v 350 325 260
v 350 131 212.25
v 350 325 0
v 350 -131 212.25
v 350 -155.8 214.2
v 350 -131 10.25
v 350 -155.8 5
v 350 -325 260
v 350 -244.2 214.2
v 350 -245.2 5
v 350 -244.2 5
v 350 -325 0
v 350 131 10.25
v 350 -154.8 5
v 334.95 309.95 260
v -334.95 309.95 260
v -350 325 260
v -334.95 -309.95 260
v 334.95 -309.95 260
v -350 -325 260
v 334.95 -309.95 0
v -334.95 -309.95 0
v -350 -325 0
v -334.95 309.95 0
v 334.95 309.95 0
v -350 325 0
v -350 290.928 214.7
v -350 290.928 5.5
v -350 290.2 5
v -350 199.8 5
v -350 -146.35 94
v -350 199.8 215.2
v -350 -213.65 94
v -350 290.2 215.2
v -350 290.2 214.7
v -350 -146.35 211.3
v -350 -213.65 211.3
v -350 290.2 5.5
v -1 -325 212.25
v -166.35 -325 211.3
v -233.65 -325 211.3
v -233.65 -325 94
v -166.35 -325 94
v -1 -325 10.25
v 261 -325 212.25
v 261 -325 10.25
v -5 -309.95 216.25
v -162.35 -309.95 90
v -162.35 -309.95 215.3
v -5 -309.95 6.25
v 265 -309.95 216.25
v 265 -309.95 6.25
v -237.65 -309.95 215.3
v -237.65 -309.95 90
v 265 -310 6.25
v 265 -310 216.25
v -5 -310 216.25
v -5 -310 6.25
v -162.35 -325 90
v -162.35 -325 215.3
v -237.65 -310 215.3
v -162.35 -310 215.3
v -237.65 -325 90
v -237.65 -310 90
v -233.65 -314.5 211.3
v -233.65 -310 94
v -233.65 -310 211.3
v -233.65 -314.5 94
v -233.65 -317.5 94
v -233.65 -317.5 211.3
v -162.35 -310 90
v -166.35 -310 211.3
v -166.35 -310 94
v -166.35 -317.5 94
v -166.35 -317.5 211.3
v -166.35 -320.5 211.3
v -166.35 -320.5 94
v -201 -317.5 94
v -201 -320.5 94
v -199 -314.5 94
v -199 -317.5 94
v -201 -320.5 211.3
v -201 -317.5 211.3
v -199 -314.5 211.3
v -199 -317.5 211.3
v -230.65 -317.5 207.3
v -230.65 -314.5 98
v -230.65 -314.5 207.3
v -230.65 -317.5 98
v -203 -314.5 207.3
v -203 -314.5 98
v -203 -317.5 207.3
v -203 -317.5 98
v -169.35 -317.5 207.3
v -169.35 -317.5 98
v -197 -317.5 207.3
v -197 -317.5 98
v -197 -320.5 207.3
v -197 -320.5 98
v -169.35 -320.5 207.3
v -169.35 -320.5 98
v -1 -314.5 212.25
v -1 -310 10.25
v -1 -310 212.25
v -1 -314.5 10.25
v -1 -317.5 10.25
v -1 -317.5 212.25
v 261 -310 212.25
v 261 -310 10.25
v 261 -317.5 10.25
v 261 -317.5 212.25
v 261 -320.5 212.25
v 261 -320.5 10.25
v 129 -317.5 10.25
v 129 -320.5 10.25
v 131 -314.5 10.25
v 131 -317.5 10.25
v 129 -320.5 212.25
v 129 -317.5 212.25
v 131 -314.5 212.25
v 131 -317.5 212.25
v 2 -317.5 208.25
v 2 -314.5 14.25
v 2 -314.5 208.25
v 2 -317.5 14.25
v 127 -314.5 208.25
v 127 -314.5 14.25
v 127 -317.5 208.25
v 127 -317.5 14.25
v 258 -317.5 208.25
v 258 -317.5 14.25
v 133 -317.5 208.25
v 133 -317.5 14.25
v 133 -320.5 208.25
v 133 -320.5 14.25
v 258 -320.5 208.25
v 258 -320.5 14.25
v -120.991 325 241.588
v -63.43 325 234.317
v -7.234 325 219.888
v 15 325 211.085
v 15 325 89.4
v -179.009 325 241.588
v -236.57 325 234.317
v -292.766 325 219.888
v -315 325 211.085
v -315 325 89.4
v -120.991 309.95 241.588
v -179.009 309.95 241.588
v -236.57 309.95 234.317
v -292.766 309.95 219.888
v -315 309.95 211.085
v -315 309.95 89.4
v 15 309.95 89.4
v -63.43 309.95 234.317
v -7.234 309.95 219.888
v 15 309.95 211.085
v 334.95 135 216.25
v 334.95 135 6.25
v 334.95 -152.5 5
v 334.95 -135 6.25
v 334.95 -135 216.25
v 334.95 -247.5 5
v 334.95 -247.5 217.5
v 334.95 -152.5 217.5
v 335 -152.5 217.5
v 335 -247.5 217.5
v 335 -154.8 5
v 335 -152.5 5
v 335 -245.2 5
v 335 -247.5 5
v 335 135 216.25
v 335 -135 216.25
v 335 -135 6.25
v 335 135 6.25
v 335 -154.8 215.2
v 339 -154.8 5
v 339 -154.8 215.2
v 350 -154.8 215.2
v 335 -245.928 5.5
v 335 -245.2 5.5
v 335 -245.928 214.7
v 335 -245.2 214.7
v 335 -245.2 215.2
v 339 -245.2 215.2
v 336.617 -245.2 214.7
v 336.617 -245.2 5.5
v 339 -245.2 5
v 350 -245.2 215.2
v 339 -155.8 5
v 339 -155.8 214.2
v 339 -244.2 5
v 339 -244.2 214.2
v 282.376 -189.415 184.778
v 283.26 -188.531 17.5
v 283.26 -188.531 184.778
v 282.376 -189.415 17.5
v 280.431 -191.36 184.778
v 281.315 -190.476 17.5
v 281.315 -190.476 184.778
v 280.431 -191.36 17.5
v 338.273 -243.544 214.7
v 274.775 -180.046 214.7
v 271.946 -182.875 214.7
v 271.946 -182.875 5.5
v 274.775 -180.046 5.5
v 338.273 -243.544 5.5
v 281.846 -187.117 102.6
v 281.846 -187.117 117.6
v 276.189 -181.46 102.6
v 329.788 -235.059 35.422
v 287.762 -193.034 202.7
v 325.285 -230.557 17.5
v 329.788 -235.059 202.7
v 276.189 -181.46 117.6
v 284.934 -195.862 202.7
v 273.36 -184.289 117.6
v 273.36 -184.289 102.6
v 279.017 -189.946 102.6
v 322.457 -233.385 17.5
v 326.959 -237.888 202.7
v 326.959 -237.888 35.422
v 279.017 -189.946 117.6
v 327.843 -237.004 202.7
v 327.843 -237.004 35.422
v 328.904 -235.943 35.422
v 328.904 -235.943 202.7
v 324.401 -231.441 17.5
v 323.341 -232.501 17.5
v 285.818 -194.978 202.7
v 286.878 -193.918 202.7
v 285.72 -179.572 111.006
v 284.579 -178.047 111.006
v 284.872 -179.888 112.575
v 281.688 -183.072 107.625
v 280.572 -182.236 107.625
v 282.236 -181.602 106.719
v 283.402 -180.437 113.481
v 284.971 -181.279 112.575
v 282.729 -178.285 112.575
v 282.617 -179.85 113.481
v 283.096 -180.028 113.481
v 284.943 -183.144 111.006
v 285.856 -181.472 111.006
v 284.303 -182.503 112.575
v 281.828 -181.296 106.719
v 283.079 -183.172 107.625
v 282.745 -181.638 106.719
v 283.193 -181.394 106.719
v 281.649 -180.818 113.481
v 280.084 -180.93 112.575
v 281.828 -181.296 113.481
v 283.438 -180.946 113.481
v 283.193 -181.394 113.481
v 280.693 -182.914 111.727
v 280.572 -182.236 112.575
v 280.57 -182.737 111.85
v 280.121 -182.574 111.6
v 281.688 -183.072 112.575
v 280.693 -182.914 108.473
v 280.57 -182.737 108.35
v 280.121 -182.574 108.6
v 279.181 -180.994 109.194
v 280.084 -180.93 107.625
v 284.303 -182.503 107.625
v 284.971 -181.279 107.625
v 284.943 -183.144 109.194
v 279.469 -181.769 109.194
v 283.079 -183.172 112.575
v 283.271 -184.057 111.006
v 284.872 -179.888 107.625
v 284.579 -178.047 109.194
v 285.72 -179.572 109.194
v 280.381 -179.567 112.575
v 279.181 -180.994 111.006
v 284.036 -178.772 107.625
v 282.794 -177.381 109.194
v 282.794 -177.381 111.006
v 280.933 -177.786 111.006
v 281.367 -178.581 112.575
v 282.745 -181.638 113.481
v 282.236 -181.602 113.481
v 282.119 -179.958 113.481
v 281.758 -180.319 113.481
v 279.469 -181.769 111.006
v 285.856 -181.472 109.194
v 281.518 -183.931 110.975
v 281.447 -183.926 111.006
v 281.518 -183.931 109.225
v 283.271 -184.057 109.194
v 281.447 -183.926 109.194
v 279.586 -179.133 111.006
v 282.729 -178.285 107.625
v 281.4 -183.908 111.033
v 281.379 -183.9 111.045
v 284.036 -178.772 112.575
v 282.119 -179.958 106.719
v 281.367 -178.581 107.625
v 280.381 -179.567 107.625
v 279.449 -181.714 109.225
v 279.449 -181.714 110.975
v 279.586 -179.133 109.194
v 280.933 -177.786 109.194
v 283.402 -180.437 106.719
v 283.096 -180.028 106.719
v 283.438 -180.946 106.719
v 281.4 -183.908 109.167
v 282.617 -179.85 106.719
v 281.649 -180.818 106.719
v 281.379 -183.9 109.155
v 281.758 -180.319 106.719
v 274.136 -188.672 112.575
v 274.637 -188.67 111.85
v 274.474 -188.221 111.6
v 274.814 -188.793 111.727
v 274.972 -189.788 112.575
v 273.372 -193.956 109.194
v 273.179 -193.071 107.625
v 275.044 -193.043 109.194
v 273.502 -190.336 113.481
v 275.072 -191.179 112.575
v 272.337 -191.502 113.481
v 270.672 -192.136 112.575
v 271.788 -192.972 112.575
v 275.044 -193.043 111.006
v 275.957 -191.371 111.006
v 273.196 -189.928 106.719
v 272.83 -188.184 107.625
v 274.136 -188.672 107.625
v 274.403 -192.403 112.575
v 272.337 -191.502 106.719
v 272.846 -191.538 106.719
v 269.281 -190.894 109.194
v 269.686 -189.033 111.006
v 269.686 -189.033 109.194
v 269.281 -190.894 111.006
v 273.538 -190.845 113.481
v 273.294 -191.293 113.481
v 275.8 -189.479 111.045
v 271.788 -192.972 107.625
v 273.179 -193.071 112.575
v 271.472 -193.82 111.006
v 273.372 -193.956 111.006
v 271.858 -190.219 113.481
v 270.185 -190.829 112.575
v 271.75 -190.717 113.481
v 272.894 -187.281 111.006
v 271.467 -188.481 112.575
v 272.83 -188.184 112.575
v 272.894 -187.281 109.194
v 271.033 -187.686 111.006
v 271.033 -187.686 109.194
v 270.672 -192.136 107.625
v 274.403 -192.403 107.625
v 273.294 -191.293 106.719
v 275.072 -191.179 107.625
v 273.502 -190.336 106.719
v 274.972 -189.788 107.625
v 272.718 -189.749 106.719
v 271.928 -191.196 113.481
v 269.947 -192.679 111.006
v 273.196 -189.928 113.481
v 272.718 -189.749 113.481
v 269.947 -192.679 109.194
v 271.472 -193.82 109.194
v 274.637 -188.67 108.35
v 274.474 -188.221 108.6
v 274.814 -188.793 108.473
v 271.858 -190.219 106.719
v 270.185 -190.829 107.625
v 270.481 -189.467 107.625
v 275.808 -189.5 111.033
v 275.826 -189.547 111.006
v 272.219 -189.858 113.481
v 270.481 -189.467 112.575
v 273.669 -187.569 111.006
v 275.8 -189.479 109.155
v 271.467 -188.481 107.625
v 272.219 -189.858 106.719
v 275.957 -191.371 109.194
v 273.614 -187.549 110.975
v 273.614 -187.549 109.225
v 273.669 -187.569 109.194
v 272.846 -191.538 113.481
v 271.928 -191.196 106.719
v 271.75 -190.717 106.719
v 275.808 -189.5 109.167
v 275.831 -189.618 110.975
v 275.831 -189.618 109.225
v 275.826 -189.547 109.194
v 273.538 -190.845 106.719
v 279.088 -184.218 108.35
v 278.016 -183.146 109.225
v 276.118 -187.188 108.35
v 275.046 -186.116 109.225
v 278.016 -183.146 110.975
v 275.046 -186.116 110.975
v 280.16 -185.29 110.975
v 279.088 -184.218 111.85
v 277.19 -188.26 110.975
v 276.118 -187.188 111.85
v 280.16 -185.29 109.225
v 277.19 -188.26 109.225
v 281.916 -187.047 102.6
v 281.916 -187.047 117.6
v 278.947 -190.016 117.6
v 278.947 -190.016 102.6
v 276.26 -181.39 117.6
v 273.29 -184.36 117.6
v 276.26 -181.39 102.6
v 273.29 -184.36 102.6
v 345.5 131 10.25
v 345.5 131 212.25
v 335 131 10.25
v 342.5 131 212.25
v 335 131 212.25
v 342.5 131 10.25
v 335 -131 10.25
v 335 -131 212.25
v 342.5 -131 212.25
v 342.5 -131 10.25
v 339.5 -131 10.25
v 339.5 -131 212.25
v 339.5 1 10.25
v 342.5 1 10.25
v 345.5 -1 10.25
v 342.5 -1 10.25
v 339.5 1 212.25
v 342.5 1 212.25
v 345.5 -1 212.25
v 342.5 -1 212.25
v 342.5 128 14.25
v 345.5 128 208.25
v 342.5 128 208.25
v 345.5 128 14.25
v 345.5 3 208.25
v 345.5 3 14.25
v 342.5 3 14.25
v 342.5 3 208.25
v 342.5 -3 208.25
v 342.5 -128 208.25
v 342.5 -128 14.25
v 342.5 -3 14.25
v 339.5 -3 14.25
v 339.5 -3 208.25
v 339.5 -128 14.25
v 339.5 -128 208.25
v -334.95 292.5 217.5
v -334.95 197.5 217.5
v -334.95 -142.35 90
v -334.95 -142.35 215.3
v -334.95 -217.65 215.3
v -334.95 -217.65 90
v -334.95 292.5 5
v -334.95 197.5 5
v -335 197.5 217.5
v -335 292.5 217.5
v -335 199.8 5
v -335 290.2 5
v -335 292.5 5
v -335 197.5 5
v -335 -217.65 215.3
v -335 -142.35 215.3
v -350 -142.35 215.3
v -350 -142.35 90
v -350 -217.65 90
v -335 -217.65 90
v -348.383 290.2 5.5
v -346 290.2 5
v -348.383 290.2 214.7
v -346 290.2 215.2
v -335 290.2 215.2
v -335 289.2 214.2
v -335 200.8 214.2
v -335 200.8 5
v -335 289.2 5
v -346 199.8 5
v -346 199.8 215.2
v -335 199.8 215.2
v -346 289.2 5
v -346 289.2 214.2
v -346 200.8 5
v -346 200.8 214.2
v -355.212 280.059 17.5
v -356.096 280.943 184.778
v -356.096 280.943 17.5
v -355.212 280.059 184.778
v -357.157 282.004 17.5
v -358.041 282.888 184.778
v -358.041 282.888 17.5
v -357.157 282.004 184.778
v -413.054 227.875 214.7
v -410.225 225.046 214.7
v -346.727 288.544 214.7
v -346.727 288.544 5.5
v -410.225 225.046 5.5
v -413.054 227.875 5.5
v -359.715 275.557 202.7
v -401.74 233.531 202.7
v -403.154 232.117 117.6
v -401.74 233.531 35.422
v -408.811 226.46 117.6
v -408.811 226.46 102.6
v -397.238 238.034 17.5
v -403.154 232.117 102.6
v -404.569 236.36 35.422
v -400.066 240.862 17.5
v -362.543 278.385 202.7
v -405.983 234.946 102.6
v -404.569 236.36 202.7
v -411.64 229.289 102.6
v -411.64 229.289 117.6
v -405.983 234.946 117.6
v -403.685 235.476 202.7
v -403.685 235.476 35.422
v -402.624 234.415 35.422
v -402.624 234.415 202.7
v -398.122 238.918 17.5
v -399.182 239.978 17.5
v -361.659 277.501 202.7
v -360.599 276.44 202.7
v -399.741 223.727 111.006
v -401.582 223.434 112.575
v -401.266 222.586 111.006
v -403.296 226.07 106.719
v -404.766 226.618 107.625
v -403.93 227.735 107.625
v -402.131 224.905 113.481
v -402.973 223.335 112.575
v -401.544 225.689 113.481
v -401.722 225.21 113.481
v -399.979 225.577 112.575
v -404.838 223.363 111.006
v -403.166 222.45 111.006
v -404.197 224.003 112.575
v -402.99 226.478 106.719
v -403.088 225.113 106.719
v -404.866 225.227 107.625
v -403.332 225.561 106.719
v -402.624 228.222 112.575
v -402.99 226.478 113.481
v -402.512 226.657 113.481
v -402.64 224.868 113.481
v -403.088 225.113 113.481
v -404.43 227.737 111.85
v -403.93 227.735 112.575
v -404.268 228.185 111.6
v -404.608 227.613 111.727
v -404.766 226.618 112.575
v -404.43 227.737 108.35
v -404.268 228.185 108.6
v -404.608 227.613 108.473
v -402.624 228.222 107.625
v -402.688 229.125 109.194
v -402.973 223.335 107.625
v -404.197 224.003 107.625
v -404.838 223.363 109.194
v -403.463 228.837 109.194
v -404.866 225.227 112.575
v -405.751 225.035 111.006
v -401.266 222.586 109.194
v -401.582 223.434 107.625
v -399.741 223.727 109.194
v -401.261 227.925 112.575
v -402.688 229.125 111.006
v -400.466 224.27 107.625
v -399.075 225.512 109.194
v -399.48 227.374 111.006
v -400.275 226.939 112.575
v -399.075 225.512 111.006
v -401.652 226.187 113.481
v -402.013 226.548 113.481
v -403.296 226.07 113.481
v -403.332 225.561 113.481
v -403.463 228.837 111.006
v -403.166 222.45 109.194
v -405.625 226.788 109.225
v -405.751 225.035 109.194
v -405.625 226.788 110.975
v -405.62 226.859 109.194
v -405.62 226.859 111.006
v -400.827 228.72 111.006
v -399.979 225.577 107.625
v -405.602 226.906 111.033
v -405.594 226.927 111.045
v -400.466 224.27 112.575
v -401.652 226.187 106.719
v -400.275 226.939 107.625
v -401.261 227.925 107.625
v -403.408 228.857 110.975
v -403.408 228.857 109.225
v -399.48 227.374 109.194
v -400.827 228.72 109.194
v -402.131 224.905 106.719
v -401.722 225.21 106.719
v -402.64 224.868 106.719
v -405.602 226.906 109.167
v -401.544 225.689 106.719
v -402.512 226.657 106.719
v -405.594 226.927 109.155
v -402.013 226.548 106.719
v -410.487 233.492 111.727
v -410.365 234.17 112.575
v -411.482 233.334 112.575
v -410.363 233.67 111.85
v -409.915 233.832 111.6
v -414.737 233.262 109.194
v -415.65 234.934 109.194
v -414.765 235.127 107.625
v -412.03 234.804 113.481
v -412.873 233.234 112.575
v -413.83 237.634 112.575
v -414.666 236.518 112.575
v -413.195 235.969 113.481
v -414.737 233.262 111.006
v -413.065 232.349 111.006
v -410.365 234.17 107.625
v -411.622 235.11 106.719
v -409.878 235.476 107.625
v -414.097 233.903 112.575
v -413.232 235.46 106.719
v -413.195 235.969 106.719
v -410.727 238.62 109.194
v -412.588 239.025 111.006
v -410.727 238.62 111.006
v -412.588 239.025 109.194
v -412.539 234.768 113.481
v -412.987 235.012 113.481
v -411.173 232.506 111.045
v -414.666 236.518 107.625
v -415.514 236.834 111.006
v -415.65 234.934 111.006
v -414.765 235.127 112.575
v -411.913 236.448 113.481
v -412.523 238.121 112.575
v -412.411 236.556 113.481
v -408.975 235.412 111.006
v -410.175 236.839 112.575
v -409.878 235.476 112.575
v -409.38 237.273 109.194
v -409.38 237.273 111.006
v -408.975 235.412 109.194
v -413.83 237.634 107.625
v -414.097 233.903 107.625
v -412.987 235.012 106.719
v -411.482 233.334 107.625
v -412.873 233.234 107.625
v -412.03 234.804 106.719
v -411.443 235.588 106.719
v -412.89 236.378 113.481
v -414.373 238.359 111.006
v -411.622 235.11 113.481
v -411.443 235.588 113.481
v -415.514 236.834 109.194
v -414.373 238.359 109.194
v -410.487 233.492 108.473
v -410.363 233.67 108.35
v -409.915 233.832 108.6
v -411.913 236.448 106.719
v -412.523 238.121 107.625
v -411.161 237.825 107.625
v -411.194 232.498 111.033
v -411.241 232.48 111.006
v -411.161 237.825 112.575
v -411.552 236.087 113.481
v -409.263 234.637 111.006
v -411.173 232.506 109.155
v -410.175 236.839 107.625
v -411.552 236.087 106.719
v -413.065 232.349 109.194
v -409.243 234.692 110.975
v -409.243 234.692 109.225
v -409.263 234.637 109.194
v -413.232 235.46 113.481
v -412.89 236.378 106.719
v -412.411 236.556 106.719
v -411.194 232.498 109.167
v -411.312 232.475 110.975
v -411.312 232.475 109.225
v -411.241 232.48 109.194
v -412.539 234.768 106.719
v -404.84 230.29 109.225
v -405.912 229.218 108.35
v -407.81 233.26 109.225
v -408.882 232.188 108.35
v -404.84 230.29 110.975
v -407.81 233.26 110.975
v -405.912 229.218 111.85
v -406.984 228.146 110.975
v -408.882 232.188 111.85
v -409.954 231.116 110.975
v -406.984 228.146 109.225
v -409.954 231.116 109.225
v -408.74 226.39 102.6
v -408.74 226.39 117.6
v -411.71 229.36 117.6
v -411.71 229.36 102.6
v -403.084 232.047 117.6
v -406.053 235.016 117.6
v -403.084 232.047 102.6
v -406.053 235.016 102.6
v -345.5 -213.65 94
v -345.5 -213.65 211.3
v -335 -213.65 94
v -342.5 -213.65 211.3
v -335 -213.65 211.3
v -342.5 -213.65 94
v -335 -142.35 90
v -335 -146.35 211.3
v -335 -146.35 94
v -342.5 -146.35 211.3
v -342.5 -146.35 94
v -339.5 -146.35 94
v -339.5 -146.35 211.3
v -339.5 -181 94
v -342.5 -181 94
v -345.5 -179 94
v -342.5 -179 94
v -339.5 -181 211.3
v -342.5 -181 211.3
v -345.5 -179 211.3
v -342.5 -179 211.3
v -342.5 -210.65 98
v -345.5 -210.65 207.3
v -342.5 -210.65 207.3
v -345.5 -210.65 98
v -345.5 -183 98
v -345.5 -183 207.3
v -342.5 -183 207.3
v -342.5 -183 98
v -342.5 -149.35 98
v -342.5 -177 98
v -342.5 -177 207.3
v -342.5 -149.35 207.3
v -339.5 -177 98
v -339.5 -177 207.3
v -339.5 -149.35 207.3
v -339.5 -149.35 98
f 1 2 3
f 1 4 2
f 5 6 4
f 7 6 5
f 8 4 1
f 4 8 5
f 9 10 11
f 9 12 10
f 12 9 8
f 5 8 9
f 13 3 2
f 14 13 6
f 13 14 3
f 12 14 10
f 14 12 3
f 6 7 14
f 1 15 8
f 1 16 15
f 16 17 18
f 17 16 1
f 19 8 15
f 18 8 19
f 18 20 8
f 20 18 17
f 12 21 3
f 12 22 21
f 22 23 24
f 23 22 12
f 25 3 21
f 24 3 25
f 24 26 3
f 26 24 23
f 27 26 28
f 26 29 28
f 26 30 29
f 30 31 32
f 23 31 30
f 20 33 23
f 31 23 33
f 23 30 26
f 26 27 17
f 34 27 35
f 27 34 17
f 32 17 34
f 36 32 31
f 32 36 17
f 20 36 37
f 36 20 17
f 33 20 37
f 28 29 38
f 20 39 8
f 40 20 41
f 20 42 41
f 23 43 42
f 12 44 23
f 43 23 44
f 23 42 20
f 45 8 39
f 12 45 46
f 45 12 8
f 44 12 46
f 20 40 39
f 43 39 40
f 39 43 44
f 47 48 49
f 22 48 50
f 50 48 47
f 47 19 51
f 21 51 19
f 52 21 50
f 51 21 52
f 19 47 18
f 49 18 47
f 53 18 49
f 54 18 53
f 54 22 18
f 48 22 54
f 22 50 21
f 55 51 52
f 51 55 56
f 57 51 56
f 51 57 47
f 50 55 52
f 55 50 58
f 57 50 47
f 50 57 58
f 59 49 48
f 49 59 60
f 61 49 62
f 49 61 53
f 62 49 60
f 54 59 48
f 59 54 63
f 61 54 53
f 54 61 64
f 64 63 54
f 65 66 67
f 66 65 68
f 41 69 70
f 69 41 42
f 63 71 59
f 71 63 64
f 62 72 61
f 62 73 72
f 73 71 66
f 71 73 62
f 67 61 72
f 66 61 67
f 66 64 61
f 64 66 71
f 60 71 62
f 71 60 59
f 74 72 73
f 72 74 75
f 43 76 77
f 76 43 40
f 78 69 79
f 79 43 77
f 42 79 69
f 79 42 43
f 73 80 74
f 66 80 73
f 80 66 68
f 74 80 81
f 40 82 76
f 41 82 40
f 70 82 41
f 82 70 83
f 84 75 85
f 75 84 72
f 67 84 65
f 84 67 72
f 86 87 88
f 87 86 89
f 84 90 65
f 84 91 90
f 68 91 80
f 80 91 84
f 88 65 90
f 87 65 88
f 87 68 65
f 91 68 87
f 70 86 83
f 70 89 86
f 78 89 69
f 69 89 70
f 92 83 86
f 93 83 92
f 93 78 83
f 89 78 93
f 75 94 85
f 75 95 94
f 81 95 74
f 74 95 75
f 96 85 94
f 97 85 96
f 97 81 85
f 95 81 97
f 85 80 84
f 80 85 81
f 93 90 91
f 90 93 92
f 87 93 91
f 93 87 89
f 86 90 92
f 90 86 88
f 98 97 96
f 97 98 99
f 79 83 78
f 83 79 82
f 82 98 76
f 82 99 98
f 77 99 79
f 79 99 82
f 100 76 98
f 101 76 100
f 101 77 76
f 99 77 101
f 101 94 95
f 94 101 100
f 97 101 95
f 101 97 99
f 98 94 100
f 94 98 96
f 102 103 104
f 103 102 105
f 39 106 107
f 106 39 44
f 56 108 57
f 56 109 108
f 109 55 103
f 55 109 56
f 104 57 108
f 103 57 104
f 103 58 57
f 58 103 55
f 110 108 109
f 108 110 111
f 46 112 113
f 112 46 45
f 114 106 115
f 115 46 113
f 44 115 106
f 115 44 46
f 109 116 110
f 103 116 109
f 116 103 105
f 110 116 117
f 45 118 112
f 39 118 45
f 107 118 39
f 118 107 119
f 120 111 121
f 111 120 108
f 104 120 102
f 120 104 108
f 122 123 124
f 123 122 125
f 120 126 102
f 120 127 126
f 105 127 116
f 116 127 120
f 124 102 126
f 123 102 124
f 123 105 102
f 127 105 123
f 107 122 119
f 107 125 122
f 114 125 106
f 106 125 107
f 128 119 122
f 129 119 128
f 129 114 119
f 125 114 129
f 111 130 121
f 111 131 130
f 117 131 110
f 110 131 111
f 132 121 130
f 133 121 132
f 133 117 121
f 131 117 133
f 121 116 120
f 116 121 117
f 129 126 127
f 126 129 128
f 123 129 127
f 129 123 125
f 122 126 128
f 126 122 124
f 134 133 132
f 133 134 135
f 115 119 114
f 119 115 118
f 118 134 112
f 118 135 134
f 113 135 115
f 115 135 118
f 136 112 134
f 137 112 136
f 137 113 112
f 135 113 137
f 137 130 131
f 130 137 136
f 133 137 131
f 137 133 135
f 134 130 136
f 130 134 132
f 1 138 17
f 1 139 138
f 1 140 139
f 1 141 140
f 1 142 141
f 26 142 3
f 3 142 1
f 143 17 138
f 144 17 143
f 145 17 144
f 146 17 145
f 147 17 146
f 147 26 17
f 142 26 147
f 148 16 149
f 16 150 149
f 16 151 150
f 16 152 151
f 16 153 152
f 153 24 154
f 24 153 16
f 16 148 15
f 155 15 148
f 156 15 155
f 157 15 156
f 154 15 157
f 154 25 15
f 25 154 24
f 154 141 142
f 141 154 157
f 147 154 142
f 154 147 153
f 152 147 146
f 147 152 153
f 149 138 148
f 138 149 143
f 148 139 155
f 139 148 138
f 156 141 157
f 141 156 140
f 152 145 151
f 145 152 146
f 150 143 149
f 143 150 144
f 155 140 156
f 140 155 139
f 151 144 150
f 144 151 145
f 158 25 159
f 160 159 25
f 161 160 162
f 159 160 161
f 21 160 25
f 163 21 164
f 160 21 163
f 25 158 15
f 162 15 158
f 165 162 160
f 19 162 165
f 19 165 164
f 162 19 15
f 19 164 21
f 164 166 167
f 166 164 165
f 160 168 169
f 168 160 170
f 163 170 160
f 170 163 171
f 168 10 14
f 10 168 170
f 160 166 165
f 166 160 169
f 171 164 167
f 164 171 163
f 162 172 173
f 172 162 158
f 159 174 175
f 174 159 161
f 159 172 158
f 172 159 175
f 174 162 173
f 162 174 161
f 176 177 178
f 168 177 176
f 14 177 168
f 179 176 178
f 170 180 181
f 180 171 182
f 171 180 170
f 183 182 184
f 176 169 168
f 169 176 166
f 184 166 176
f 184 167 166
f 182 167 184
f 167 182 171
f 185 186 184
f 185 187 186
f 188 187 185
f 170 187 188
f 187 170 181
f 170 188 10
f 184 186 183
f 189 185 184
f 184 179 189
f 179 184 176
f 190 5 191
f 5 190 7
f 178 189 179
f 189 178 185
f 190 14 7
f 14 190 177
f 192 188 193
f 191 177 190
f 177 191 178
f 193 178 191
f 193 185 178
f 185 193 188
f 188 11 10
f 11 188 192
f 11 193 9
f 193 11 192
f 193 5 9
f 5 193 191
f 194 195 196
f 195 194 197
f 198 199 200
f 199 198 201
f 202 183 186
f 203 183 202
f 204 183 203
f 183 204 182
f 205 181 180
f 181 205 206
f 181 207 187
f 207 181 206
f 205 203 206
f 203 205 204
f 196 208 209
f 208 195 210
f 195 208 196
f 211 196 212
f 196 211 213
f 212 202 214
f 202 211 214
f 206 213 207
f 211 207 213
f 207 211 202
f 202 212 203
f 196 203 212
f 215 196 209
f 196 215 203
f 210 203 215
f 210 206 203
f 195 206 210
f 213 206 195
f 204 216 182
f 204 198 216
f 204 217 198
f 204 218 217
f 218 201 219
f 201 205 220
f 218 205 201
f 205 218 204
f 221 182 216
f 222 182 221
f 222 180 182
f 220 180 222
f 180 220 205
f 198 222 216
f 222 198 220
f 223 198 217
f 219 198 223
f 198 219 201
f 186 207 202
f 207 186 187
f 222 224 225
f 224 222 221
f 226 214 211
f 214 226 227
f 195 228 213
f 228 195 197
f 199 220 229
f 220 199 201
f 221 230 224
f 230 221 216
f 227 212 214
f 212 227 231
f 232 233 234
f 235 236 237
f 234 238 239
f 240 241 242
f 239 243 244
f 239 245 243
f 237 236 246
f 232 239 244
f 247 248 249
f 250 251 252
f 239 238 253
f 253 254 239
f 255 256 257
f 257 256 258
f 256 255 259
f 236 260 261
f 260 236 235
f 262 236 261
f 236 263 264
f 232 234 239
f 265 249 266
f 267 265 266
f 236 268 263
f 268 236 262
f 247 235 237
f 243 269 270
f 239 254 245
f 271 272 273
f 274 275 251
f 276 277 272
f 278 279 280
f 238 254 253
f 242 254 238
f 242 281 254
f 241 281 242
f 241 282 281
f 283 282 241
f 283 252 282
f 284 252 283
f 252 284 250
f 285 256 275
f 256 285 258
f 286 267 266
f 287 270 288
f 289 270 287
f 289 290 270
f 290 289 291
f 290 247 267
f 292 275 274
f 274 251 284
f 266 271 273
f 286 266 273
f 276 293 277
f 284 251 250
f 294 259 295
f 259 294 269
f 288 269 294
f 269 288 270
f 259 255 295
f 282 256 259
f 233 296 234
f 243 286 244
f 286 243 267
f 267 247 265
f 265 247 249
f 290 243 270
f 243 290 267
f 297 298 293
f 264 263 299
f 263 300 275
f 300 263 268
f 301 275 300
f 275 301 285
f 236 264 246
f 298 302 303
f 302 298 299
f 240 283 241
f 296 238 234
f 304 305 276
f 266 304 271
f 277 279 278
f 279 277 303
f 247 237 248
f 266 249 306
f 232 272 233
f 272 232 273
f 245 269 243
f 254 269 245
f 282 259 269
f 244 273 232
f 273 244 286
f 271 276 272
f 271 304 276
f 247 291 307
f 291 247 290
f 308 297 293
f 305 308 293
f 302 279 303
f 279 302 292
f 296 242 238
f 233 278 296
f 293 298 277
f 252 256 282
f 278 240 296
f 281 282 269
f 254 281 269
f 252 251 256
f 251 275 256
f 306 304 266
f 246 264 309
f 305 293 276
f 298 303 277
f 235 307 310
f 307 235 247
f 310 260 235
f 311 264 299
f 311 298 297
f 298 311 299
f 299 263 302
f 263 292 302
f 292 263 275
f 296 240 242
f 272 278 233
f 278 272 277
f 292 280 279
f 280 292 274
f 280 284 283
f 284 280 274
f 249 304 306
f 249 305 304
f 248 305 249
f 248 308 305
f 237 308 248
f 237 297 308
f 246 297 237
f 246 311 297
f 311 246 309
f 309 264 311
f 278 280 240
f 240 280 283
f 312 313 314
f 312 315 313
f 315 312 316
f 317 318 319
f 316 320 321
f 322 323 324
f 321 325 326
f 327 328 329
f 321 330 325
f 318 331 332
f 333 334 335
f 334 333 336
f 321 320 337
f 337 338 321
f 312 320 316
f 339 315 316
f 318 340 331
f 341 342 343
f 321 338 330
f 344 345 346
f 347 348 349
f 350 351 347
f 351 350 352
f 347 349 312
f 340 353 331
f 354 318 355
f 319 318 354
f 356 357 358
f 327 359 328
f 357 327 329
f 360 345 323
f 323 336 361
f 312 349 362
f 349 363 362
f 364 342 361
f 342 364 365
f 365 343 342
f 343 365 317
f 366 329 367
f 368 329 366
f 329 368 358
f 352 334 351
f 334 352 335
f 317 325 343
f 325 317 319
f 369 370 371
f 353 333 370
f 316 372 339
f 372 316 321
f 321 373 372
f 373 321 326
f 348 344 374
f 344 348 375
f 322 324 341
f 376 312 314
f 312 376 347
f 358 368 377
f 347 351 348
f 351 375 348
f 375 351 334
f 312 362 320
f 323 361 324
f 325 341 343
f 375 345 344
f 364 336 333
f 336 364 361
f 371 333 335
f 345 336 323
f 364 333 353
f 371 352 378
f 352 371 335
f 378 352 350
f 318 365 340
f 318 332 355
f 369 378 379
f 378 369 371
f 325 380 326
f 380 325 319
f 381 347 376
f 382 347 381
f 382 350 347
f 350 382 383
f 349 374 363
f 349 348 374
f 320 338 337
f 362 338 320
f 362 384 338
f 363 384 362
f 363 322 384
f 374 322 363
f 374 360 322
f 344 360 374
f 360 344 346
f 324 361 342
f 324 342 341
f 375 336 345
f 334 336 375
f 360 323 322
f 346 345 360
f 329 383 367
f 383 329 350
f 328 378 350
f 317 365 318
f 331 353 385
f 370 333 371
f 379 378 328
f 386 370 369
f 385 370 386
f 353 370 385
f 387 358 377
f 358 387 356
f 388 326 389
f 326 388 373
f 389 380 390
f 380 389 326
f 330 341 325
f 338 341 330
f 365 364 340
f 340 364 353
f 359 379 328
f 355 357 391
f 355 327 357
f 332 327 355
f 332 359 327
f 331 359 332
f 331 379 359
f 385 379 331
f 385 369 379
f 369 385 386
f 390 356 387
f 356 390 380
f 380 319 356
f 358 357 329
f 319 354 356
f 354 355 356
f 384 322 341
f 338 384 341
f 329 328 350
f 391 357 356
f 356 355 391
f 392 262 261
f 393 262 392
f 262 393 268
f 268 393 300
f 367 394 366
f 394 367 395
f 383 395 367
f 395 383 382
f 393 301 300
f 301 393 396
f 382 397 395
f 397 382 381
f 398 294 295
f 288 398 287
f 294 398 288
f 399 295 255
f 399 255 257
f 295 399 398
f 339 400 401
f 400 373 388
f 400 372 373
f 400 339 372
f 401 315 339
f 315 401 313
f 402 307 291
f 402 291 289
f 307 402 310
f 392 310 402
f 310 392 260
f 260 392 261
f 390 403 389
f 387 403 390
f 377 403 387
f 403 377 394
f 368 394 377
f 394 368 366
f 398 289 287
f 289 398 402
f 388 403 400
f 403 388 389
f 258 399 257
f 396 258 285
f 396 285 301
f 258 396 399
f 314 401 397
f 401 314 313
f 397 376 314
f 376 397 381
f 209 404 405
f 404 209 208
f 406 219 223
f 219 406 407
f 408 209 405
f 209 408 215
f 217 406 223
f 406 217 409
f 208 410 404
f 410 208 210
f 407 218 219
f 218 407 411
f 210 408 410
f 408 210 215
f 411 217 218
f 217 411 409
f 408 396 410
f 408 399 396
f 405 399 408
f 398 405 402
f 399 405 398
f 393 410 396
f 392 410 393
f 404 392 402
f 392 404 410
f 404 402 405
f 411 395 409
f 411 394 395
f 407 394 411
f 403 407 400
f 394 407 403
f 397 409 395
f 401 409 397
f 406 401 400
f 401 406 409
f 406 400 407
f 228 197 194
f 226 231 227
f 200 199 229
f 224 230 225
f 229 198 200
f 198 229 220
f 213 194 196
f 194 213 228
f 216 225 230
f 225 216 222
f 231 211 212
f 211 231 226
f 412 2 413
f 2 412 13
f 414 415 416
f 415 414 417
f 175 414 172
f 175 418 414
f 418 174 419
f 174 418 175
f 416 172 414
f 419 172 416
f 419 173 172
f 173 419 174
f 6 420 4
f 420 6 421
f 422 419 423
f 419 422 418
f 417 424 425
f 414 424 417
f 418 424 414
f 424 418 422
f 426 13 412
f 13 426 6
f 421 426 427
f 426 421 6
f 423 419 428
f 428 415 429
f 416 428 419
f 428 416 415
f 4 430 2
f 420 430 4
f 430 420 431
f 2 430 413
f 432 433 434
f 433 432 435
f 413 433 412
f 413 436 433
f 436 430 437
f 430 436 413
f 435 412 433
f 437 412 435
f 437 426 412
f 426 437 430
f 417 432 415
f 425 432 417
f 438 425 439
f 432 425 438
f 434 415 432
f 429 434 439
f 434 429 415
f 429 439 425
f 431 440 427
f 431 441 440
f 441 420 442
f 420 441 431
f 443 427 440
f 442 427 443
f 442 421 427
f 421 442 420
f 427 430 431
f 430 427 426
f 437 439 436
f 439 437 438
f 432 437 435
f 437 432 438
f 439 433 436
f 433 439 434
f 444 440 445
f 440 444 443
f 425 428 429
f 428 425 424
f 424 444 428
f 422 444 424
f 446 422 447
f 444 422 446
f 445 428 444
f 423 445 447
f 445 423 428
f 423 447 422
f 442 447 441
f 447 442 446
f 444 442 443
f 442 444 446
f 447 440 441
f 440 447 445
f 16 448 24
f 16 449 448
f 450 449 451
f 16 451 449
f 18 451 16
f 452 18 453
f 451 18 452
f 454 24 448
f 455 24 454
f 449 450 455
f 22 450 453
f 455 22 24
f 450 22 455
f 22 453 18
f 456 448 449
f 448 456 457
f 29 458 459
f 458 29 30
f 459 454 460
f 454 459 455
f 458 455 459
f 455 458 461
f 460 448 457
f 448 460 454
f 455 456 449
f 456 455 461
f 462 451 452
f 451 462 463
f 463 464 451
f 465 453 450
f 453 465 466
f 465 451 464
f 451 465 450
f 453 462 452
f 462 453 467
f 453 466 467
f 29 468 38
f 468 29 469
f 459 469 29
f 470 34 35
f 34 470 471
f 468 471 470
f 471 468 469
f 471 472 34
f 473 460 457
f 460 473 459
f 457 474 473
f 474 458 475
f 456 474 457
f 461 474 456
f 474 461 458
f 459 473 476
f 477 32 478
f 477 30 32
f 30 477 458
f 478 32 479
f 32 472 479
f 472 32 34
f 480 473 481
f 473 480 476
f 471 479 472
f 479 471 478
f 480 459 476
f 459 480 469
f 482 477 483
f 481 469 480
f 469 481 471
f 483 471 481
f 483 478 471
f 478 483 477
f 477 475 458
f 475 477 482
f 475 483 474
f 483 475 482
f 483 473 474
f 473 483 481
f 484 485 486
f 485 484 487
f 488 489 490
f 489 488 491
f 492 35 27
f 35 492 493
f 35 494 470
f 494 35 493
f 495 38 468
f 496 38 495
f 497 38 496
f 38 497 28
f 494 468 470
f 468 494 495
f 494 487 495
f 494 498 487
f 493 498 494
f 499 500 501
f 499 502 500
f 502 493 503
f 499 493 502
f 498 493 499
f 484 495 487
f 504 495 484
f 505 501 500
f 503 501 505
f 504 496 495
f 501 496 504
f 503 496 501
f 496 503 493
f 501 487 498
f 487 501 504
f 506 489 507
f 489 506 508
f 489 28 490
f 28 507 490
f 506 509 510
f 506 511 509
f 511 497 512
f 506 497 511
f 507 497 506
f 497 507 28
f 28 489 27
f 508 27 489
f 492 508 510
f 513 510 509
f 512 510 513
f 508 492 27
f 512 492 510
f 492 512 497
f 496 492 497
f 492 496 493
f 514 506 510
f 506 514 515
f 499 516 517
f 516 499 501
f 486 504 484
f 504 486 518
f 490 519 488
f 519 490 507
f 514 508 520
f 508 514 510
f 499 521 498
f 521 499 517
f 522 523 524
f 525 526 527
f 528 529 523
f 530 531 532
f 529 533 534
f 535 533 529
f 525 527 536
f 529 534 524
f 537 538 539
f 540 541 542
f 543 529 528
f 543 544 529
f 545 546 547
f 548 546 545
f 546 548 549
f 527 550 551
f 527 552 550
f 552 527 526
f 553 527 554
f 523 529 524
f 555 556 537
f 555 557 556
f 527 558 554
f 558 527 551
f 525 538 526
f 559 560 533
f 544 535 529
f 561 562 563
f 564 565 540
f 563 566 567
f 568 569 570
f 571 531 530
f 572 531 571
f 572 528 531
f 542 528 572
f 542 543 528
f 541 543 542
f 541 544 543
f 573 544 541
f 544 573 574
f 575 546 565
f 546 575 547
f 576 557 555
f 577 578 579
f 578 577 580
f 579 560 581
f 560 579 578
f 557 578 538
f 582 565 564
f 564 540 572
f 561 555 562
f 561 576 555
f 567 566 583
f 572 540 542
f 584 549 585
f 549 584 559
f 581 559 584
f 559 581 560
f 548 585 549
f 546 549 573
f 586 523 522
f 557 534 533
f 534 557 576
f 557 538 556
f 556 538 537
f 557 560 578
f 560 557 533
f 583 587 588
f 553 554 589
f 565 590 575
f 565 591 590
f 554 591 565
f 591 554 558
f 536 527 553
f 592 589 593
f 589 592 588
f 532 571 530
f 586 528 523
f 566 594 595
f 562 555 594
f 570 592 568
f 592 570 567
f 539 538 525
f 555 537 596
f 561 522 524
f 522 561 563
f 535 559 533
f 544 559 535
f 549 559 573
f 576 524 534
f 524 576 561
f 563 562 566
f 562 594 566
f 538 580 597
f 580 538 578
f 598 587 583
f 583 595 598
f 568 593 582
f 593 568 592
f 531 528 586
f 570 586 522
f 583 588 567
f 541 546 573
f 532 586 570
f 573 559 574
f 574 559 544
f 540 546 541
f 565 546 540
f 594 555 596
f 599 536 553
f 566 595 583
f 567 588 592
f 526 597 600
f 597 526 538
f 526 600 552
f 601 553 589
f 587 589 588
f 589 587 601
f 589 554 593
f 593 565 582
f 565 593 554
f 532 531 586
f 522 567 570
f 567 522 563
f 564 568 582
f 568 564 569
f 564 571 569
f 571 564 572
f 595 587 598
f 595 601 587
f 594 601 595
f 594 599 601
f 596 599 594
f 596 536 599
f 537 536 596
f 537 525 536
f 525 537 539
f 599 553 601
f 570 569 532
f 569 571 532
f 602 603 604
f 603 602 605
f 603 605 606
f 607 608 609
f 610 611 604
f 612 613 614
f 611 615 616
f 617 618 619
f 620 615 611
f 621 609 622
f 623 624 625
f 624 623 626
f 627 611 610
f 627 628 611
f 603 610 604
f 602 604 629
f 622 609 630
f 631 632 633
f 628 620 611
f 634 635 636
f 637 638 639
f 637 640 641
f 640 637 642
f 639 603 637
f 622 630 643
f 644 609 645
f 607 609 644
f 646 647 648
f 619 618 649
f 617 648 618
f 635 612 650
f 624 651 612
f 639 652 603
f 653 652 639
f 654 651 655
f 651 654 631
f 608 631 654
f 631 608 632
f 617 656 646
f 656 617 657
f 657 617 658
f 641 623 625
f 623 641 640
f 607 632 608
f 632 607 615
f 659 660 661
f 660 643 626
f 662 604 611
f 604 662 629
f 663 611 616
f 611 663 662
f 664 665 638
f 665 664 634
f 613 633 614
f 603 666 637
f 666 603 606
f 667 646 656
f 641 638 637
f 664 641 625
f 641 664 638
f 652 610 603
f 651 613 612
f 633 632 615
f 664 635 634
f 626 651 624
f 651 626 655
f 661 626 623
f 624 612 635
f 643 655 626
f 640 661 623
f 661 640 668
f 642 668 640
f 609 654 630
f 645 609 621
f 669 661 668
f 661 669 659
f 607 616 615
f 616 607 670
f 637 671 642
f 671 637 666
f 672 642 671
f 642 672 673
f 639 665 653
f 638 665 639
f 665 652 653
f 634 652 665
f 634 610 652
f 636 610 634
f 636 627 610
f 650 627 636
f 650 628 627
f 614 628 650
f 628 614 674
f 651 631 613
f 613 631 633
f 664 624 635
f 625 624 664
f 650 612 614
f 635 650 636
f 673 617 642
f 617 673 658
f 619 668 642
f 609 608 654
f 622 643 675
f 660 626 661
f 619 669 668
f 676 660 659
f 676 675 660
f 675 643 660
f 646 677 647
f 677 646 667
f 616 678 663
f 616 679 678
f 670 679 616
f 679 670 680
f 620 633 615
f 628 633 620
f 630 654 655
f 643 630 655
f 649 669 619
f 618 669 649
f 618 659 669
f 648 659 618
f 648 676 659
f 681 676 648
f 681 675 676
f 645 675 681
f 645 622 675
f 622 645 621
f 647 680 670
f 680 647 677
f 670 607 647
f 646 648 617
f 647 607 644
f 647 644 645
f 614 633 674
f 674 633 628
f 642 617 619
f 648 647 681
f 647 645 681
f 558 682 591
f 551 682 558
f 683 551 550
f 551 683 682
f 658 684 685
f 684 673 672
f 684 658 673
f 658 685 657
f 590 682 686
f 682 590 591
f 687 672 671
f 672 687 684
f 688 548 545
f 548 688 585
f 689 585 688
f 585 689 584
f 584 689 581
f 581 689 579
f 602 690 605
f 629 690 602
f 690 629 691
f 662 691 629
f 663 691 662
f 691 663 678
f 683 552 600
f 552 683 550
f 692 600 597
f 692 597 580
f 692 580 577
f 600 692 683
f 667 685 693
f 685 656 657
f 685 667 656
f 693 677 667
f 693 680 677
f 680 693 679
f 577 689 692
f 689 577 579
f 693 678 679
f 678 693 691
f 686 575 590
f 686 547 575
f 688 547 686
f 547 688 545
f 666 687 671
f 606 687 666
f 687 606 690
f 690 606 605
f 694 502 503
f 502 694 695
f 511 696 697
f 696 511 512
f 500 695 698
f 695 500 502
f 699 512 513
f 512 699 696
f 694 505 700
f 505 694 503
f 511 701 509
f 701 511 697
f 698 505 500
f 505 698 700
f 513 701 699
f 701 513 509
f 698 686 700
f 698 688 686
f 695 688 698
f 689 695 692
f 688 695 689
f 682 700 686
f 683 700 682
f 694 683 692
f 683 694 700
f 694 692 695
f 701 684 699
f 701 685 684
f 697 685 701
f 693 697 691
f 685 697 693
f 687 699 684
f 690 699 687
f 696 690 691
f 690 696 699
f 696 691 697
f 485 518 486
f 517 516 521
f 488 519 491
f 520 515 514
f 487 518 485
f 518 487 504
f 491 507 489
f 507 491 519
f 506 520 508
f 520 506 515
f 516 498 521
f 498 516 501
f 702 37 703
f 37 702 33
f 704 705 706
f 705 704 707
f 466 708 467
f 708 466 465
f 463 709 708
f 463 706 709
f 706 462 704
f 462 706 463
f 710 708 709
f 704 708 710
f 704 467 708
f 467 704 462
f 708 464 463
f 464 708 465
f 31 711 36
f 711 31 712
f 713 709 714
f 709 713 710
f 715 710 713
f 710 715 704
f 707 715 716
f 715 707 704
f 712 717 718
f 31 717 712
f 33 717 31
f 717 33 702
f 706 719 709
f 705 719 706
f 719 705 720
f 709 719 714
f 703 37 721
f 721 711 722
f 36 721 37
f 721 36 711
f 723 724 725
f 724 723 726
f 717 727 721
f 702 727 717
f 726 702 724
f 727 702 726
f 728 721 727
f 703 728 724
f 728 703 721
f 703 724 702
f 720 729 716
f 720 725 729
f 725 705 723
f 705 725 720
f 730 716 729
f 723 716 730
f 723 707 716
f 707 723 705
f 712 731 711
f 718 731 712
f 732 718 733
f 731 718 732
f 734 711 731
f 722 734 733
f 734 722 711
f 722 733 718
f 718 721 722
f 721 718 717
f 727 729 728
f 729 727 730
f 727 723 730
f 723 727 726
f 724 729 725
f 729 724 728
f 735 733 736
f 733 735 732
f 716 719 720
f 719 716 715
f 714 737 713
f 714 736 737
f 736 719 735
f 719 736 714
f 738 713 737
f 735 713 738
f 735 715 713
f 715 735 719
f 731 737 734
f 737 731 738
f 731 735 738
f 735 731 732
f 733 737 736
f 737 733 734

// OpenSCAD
// file: ../windows/slidingwindow.scad
module slidingwindow(width=120, height=200, wall_thickness=15) 
{
    profile_width = 4;
    profile_depth = 3.0;
    frame_profile_width = 4;
    frame_profile_depth = wall_thickness;
    
    /* Outer frame fixed to convrete wall. */
    color([0.2,0.0,0.1])
    genericframe(width, height, frame_profile_width, frame_profile_depth);

    /* Calculate opning size. */
    open_w = width - 2 * frame_profile_width;
    open_h = height - 2 * frame_profile_width;
    half_open_w = (open_w + frame_profile_width)/2; 
    
    /* Left window glass frame. */
    translate([-(open_w)/4, profile_depth/2, 0]) 
    color([0.5,0.3,0.3])
    genericframe(half_open_w, open_h, profile_width, profile_depth);

    /* Right window glass frame. */
    translate([(open_w)/4, -profile_depth/2, 0]) 
    color([0.5,0.3,0.3])
    genericframe(half_open_w, open_h, profile_width, profile_depth);
}

module genericframe(width=70, height=110, profile_width = 5, profile_depth = 8) 
{
    translate([-(width - profile_width)/2, 0, 0]) 
    cube([profile_width,profile_depth, height], center=true);
    
    translate([(width - profile_width)/2, 0, 0]) 
    cube([profile_width,profile_depth, height], center=true);

    translate([0, 0, -(height - profile_width)/2]) 
    cube([width, profile_depth, profile_width], center=true);

    translate([0, 0, (height - profile_width)/2]) 
    cube([width, profile_depth, profile_width], center=true);
}    

// For testing
slidingwindow();
// file: ../doors/arcdoorhole.scad
module arcdoorhole(door_width=300, door_height=260,wall_thickness=15, wall_color=[0,0,1],wall_alpha=0.3)
{
    $fn = 50;
    r = 1.4 * door_width;
    dx = door_width / 2; 
    
    intersection() {
        color(wall_color, 1.0) 
        translate([0,0,door_height/2-0.1])
        cube([door_width, wall_thickness+1.2, door_height],center=true);
        
        color(wall_color, 1.0)
        translate([0,0, door_height - r])
        rotate([90,0,0]) 
        cylinder(h=wall_thickness+1.2, r=r, center=true); 
    }
}

// For testing
arcdoorhole();
// file: ../doors/slidingdoor.scad
module slidingdoor(width=240, height=210, wall_thickness=15) 
{
    door_thickness = 4.0;
    profile_width = 4;
    profile_depth = 3.0;
    frame_profile_width = 4;
    frame_profile_depth = wall_thickness;
    
    //translate([0, 
    //    -(frame_profile_depth-door_thickness)/2, height/2])
    union() {
             
        /* Outer frame fixed to concrete wall. */
        color([0.2,0.0,0.1])
        genericdoorframe(width, height, frame_profile_width, frame_profile_depth);
    
        /* Calculate opning size. */
        open_w = width - 2 * frame_profile_width;
        open_h = height - 2 * frame_profile_width;
        half_open_w = (open_w + frame_profile_width)/2; 
        
        /* Left window glass frame. */
        translate([-(open_w)/4, profile_depth/2, 0]) 
        color([0.5,0.3,0.3])
        genericdoorframe(half_open_w, open_h, profile_width, profile_depth);
    
        /* Right window glass frame. */
        translate([(open_w)/4, -profile_depth/2, 0]) 
        color([0.5,0.3,0.3])
        genericdoorframe(half_open_w, open_h, profile_width, profile_depth);
    }
}

module genericdoorframe(width=70, height=110, profile_width = 5, profile_depth = 8) 
{
    translate([-(width - profile_width)/2, 0, 0]) 
    cube([profile_width,profile_depth, height], center=true);
    
    translate([(width - profile_width)/2, 0, 0]) 
    cube([profile_width,profile_depth, height], center=true);

    translate([0, 0, -(height - profile_width)/2]) 
    cube([width, profile_depth, profile_width], center=true);

    translate([0, 0, (height - profile_width)/2]) 
    cube([width, profile_depth, profile_width], center=true);
}    

/* For testing */
slidingdoor();
// file: ../doors/basicdoor.scad
module basicdoor(width=95.3, height=213.2, wall_thickness=15, right_handed = false, open_angle = 30) 
{
    profile_width = 12;
    door_thickness = 4.0;
    frame_profile_width = 2.3;
    frame_profile_depth = wall_thickness;
    seal_profile_width = 1.0;
    
    /* Outer frame fixed to convrete wall. */
    color([0.3,0.0,0.1])
    basicdoorframe(false, width, height, frame_profile_width, frame_profile_depth);

    color([0.4,0.2,0.2])
    translate([0, door_thickness/2,-frame_profile_width/2])
    basicdoorframe(false, width - 2 * frame_profile_width,
        height - frame_profile_width, 
        seal_profile_width, frame_profile_depth - door_thickness);
    
    /* Calculate door size. */
    open_w = width - 2 * frame_profile_width - 0.6;
    open_h = height - frame_profile_width - 1.0;

    ow = open_w/2 + 0.2;
    translate([right_handed?-ow:ow, 
        -(frame_profile_depth-door_thickness)/2, -frame_profile_width/2])
    rotate([0, 0, right_handed?-open_angle:open_angle])
    translate([right_handed?ow:-ow, 0, 0])
     union() {
        /* Playwood */
        color([0.4,0.0,0.1])
        cube([open_w, 1.5, open_h], center=true);
        
        /* Door strengtehing. */
        color([0.5,0.2,0.2])
        basicdoorframe(true, open_w, open_h, profile_width, door_thickness);
        
         /* Diagonal strengthening */
        dx = open_w - 2*profile_width;
        dy = open_h - 2*profile_width;
        l = sqrt(dx*dx+dy*dy);
        rotate([0,-atan2(dx,dy), 0])
        color([0.5,0.2,0.2])
        cube([profile_width, door_thickness, l], center=true);
         
         /* Door knob */
         translate([right_handed ? open_w/2 - 6.0 : -open_w/2 + 6.0, 0, 0])
         color([218/255,172/255,96/255])
         doorknob(door_thickness);
    }
}

module basicdoorframe(draw_bottom=true,width=70, height=110, profile_width = 5, door_thickness = 8) 
{
    translate([-(width - profile_width)/2, 0, 0]) 
    cube([profile_width,door_thickness, height], center=true);
    
    translate([(width - profile_width)/2, 0, 0]) 
    cube([profile_width,door_thickness, height], center=true);

    if (draw_bottom) {
        translate([0, 0, -(height - profile_width)/2]) 
        cube([width, door_thickness, profile_width], center=true);
    }
    
    translate([0, 0, (height - profile_width)/2]) 
    cube([width, door_thickness, profile_width], center=true);
}    

module doorknob(door_thickness = 8)
{
    doorknob_length = 7;
    doorknob_r = 3.5;
    
    translate([0, doorknob_length, 0]) 
    sphere(r=doorknob_r);
    translate([0, -doorknob_length, 0]) 
    sphere(r=doorknob_r);
 
    rotate([90, 90, 0])
    cylinder(h = doorknob_length*2, r = 0.5 * doorknob_r, center=true);
   
    cube([8, door_thickness+0.2, 15],center=true); 
}

// For testing
basicdoor();
// main file
use <../doors/basicdoor.scad>
use <../doors/slidingdoor.scad>
use <../doors/arcdoorhole.scad> 
use <../windows/slidingwindow.scad>

module masterbedroomwalls(width=650, length=700, wall_thickness=15, wall_height=260,wall_color=[255/255, 255/255, 255/255],wall_alpha=1.0)
{
    // Colors
    paint_the_room = [55.0/255, 235/255,20/255];
    
    // Door opening size. Then we need some extra space for the door frame.
    door_width = 90+5;
    door_height = 210+2.5;
    
    // Position the door so that bottom of opening is 5 cm above floor level
    door_y_pos = (wall_height-door_height)/2 - 5;
        
    // Position the door horizontally off the center.
    door1_x_pos = width/2 - 80;
    door2_x_pos = -width/2 + 125;
    side_door_x_pos = -width/10;
    
    // Rise the part of floor which should stay dry by 2.5 cm.
    rise_floor = 2.5;
    rised_width = width/2;
    
    // Rise walk in floor more to allow sitting to toilet seat with dry feet by 2.0 cm for 100 cm
    double_rise_floor = 2.0;
    double_rised_length = 100;

    /* Arc window */
    arc_window_width = 330;
    arc_window_height = 153;
    arc_window_x_pos = -150;
    
    /* Sliding door to swimming pool terrace */
    sliding_door_width = 270;
    sliding_door_2_width = 270;
    sliding_door_height = 210;
    sliding_door_x_pos = 0;
    sliding_door_2_x_pos = 130;
    sliding_door_y_pos = (wall_height-door_height)/2 - 5;
    
    /* Window positions */
    window_y = 90;
    window_w = 70+5.3;
    window_h = 120+5.3;
    window_1_x_pos = -200;
    window_3_x_pos = -180;
    
    
    difference() {
        union() {
            translate([0,-width/2+wall_thickness/2, wall_height/2]) 
            color(wall_color,wall_alpha) 
            cube([length, wall_thickness, wall_height],center=true);
            
            translate([0,-width/2+wall_thickness, wall_height/2]) 
            color(paint_the_room,wall_alpha) 
            cube([length, 0.1, wall_height],center=true);
        }
            
        /* Hole for sliding door to narrow terrace */
        translate([sliding_door_2_x_pos, 
            -width/2+wall_thickness/2,
            wall_height/2 - sliding_door_y_pos])
        color(wall_color, wall_alpha)
        cube([sliding_door_2_width, wall_thickness+1, 
            sliding_door_height], 
            center=true);
        
        /* Window 1 hole */
        translate([window_1_x_pos, 
            -width/2 + wall_thickness/2, 
            window_y + window_h/2]) 
        cube([window_w, wall_thickness+1,   
            window_h],center=true);
    }
    
    /* Window 1 */
    translate([window_1_x_pos, 
        - width/2 + wall_thickness/2,
        window_y + window_h/2]) 
    slidingwindow(window_w, window_h, wall_thickness); 
    
    /* Sliding door to narrow terrace */
    translate([sliding_door_2_x_pos, 
        -width/2+wall_thickness/2,
        wall_height/2 - sliding_door_y_pos])
    slidingdoor(sliding_door_width, sliding_door_height, wall_thickness); 

    difference() {
        union() {
            /* Wall */
            translate([0,
                width/2 - wall_thickness/2, 
                wall_height/2]) 
            color(wall_color, wall_alpha) 
            cube([length,  wall_thickness, wall_height],center=true);
            
            /* Paint the wall */
            translate([0,width/2-wall_thickness, wall_height/2]) 
            color(paint_the_room, wall_alpha) 
            cube([length,  0.1, wall_height],center=true);
        }
        
        /* Arc window hole */
        translate([arc_window_x_pos, 
            width/2 - wall_thickness/2, 
            door_height - arc_window_height + 30])
        arcdoorhole(arc_window_width, arc_window_height,
            wall_thickness, wall_color, 
        wall_alpha);
    }
    
    difference() {
        union() {
            translate([length/2 - wall_thickness/2,
                0, wall_height/2]) 
            color(wall_color,wall_alpha) 
            cube([wall_thickness, width, wall_height],center=true);
            
            translate([length/2 - wall_thickness, 
                0, wall_height/2]) 
            color(paint_the_room,wall_alpha) 
            cube([0.1, width, wall_height],center=true);
        }
        
        /* Door 2 hole */
        translate([length/2 - wall_thickness/2, 
            door2_x_pos, 
            wall_height/2 - door_y_pos])
        color(wall_color, wall_alpha)
        cube([wall_thickness+1, 
            door_width, door_height], 
            center=true);
      
        /* Hole for sliding door to pool terrace */
        translate([length/2 - wall_thickness/2, 
            sliding_door_x_pos, 
            wall_height/2 - sliding_door_y_pos])
        color(wall_color, wall_alpha)
        cube([wall_thickness+1, 
            sliding_door_width, sliding_door_height], 
            center=true);
        
    }     
    
    /* Door 2 */
    translate([length/2 - wall_thickness/2,
        door2_x_pos, 
        wall_height/2 - door_y_pos]) 
    rotate([0,0,-90])
    basicdoor(door_width, door_height, wall_thickness, false, 45);   

    /* Sliding door pool terrace */
    translate([length/2 - wall_thickness/2,
        sliding_door_x_pos, 
        wall_height/2 - sliding_door_y_pos]) 
    rotate([0,0,-90])
    slidingdoor(sliding_door_width, sliding_door_height, wall_thickness); 

    difference() {
        union() {
            translate([-length/2+wall_thickness/2,
                0, wall_height/2]) 
            color(wall_color,wall_alpha) 
            cube([wall_thickness, width, wall_height],center=true);
            
            translate([-length/2+wall_thickness, 
                0, wall_height/2])  
            color(paint_the_room,wall_alpha) 
            cube([0.1, width, wall_height],center=true);
        }

        /* Door 1 hole */
        translate([-length/2+wall_thickness/2, 
            door1_x_pos, 
            wall_height/2 - door_y_pos])
        color(wall_color, wall_alpha)
        cube([wall_thickness+1, 
            door_width, door_height], 
            center=true);
        
        /* Window 3 hole */
        translate([-length/2+wall_thickness/2, 
            window_3_x_pos, 
            window_y + window_h/2]) 
        cube([wall_thickness+1, window_w,    
            window_h],center=true);
    }
    
   /* Door 1 */
    translate([-length/2+wall_thickness/2,
        door1_x_pos, 
        wall_height/2 - door_y_pos]) 
    rotate([0,0,-90])
    basicdoor(door_width, door_height, wall_thickness, true, 45);   
   
    /* Window 1 */
    translate([-length/2+wall_thickness/2,
        window_3_x_pos, 
        window_y + window_h/2]) 
    rotate([0,0,90])
    slidingwindow(window_w, window_h, wall_thickness); 
}

// For testing
masterbedroomwalls();
